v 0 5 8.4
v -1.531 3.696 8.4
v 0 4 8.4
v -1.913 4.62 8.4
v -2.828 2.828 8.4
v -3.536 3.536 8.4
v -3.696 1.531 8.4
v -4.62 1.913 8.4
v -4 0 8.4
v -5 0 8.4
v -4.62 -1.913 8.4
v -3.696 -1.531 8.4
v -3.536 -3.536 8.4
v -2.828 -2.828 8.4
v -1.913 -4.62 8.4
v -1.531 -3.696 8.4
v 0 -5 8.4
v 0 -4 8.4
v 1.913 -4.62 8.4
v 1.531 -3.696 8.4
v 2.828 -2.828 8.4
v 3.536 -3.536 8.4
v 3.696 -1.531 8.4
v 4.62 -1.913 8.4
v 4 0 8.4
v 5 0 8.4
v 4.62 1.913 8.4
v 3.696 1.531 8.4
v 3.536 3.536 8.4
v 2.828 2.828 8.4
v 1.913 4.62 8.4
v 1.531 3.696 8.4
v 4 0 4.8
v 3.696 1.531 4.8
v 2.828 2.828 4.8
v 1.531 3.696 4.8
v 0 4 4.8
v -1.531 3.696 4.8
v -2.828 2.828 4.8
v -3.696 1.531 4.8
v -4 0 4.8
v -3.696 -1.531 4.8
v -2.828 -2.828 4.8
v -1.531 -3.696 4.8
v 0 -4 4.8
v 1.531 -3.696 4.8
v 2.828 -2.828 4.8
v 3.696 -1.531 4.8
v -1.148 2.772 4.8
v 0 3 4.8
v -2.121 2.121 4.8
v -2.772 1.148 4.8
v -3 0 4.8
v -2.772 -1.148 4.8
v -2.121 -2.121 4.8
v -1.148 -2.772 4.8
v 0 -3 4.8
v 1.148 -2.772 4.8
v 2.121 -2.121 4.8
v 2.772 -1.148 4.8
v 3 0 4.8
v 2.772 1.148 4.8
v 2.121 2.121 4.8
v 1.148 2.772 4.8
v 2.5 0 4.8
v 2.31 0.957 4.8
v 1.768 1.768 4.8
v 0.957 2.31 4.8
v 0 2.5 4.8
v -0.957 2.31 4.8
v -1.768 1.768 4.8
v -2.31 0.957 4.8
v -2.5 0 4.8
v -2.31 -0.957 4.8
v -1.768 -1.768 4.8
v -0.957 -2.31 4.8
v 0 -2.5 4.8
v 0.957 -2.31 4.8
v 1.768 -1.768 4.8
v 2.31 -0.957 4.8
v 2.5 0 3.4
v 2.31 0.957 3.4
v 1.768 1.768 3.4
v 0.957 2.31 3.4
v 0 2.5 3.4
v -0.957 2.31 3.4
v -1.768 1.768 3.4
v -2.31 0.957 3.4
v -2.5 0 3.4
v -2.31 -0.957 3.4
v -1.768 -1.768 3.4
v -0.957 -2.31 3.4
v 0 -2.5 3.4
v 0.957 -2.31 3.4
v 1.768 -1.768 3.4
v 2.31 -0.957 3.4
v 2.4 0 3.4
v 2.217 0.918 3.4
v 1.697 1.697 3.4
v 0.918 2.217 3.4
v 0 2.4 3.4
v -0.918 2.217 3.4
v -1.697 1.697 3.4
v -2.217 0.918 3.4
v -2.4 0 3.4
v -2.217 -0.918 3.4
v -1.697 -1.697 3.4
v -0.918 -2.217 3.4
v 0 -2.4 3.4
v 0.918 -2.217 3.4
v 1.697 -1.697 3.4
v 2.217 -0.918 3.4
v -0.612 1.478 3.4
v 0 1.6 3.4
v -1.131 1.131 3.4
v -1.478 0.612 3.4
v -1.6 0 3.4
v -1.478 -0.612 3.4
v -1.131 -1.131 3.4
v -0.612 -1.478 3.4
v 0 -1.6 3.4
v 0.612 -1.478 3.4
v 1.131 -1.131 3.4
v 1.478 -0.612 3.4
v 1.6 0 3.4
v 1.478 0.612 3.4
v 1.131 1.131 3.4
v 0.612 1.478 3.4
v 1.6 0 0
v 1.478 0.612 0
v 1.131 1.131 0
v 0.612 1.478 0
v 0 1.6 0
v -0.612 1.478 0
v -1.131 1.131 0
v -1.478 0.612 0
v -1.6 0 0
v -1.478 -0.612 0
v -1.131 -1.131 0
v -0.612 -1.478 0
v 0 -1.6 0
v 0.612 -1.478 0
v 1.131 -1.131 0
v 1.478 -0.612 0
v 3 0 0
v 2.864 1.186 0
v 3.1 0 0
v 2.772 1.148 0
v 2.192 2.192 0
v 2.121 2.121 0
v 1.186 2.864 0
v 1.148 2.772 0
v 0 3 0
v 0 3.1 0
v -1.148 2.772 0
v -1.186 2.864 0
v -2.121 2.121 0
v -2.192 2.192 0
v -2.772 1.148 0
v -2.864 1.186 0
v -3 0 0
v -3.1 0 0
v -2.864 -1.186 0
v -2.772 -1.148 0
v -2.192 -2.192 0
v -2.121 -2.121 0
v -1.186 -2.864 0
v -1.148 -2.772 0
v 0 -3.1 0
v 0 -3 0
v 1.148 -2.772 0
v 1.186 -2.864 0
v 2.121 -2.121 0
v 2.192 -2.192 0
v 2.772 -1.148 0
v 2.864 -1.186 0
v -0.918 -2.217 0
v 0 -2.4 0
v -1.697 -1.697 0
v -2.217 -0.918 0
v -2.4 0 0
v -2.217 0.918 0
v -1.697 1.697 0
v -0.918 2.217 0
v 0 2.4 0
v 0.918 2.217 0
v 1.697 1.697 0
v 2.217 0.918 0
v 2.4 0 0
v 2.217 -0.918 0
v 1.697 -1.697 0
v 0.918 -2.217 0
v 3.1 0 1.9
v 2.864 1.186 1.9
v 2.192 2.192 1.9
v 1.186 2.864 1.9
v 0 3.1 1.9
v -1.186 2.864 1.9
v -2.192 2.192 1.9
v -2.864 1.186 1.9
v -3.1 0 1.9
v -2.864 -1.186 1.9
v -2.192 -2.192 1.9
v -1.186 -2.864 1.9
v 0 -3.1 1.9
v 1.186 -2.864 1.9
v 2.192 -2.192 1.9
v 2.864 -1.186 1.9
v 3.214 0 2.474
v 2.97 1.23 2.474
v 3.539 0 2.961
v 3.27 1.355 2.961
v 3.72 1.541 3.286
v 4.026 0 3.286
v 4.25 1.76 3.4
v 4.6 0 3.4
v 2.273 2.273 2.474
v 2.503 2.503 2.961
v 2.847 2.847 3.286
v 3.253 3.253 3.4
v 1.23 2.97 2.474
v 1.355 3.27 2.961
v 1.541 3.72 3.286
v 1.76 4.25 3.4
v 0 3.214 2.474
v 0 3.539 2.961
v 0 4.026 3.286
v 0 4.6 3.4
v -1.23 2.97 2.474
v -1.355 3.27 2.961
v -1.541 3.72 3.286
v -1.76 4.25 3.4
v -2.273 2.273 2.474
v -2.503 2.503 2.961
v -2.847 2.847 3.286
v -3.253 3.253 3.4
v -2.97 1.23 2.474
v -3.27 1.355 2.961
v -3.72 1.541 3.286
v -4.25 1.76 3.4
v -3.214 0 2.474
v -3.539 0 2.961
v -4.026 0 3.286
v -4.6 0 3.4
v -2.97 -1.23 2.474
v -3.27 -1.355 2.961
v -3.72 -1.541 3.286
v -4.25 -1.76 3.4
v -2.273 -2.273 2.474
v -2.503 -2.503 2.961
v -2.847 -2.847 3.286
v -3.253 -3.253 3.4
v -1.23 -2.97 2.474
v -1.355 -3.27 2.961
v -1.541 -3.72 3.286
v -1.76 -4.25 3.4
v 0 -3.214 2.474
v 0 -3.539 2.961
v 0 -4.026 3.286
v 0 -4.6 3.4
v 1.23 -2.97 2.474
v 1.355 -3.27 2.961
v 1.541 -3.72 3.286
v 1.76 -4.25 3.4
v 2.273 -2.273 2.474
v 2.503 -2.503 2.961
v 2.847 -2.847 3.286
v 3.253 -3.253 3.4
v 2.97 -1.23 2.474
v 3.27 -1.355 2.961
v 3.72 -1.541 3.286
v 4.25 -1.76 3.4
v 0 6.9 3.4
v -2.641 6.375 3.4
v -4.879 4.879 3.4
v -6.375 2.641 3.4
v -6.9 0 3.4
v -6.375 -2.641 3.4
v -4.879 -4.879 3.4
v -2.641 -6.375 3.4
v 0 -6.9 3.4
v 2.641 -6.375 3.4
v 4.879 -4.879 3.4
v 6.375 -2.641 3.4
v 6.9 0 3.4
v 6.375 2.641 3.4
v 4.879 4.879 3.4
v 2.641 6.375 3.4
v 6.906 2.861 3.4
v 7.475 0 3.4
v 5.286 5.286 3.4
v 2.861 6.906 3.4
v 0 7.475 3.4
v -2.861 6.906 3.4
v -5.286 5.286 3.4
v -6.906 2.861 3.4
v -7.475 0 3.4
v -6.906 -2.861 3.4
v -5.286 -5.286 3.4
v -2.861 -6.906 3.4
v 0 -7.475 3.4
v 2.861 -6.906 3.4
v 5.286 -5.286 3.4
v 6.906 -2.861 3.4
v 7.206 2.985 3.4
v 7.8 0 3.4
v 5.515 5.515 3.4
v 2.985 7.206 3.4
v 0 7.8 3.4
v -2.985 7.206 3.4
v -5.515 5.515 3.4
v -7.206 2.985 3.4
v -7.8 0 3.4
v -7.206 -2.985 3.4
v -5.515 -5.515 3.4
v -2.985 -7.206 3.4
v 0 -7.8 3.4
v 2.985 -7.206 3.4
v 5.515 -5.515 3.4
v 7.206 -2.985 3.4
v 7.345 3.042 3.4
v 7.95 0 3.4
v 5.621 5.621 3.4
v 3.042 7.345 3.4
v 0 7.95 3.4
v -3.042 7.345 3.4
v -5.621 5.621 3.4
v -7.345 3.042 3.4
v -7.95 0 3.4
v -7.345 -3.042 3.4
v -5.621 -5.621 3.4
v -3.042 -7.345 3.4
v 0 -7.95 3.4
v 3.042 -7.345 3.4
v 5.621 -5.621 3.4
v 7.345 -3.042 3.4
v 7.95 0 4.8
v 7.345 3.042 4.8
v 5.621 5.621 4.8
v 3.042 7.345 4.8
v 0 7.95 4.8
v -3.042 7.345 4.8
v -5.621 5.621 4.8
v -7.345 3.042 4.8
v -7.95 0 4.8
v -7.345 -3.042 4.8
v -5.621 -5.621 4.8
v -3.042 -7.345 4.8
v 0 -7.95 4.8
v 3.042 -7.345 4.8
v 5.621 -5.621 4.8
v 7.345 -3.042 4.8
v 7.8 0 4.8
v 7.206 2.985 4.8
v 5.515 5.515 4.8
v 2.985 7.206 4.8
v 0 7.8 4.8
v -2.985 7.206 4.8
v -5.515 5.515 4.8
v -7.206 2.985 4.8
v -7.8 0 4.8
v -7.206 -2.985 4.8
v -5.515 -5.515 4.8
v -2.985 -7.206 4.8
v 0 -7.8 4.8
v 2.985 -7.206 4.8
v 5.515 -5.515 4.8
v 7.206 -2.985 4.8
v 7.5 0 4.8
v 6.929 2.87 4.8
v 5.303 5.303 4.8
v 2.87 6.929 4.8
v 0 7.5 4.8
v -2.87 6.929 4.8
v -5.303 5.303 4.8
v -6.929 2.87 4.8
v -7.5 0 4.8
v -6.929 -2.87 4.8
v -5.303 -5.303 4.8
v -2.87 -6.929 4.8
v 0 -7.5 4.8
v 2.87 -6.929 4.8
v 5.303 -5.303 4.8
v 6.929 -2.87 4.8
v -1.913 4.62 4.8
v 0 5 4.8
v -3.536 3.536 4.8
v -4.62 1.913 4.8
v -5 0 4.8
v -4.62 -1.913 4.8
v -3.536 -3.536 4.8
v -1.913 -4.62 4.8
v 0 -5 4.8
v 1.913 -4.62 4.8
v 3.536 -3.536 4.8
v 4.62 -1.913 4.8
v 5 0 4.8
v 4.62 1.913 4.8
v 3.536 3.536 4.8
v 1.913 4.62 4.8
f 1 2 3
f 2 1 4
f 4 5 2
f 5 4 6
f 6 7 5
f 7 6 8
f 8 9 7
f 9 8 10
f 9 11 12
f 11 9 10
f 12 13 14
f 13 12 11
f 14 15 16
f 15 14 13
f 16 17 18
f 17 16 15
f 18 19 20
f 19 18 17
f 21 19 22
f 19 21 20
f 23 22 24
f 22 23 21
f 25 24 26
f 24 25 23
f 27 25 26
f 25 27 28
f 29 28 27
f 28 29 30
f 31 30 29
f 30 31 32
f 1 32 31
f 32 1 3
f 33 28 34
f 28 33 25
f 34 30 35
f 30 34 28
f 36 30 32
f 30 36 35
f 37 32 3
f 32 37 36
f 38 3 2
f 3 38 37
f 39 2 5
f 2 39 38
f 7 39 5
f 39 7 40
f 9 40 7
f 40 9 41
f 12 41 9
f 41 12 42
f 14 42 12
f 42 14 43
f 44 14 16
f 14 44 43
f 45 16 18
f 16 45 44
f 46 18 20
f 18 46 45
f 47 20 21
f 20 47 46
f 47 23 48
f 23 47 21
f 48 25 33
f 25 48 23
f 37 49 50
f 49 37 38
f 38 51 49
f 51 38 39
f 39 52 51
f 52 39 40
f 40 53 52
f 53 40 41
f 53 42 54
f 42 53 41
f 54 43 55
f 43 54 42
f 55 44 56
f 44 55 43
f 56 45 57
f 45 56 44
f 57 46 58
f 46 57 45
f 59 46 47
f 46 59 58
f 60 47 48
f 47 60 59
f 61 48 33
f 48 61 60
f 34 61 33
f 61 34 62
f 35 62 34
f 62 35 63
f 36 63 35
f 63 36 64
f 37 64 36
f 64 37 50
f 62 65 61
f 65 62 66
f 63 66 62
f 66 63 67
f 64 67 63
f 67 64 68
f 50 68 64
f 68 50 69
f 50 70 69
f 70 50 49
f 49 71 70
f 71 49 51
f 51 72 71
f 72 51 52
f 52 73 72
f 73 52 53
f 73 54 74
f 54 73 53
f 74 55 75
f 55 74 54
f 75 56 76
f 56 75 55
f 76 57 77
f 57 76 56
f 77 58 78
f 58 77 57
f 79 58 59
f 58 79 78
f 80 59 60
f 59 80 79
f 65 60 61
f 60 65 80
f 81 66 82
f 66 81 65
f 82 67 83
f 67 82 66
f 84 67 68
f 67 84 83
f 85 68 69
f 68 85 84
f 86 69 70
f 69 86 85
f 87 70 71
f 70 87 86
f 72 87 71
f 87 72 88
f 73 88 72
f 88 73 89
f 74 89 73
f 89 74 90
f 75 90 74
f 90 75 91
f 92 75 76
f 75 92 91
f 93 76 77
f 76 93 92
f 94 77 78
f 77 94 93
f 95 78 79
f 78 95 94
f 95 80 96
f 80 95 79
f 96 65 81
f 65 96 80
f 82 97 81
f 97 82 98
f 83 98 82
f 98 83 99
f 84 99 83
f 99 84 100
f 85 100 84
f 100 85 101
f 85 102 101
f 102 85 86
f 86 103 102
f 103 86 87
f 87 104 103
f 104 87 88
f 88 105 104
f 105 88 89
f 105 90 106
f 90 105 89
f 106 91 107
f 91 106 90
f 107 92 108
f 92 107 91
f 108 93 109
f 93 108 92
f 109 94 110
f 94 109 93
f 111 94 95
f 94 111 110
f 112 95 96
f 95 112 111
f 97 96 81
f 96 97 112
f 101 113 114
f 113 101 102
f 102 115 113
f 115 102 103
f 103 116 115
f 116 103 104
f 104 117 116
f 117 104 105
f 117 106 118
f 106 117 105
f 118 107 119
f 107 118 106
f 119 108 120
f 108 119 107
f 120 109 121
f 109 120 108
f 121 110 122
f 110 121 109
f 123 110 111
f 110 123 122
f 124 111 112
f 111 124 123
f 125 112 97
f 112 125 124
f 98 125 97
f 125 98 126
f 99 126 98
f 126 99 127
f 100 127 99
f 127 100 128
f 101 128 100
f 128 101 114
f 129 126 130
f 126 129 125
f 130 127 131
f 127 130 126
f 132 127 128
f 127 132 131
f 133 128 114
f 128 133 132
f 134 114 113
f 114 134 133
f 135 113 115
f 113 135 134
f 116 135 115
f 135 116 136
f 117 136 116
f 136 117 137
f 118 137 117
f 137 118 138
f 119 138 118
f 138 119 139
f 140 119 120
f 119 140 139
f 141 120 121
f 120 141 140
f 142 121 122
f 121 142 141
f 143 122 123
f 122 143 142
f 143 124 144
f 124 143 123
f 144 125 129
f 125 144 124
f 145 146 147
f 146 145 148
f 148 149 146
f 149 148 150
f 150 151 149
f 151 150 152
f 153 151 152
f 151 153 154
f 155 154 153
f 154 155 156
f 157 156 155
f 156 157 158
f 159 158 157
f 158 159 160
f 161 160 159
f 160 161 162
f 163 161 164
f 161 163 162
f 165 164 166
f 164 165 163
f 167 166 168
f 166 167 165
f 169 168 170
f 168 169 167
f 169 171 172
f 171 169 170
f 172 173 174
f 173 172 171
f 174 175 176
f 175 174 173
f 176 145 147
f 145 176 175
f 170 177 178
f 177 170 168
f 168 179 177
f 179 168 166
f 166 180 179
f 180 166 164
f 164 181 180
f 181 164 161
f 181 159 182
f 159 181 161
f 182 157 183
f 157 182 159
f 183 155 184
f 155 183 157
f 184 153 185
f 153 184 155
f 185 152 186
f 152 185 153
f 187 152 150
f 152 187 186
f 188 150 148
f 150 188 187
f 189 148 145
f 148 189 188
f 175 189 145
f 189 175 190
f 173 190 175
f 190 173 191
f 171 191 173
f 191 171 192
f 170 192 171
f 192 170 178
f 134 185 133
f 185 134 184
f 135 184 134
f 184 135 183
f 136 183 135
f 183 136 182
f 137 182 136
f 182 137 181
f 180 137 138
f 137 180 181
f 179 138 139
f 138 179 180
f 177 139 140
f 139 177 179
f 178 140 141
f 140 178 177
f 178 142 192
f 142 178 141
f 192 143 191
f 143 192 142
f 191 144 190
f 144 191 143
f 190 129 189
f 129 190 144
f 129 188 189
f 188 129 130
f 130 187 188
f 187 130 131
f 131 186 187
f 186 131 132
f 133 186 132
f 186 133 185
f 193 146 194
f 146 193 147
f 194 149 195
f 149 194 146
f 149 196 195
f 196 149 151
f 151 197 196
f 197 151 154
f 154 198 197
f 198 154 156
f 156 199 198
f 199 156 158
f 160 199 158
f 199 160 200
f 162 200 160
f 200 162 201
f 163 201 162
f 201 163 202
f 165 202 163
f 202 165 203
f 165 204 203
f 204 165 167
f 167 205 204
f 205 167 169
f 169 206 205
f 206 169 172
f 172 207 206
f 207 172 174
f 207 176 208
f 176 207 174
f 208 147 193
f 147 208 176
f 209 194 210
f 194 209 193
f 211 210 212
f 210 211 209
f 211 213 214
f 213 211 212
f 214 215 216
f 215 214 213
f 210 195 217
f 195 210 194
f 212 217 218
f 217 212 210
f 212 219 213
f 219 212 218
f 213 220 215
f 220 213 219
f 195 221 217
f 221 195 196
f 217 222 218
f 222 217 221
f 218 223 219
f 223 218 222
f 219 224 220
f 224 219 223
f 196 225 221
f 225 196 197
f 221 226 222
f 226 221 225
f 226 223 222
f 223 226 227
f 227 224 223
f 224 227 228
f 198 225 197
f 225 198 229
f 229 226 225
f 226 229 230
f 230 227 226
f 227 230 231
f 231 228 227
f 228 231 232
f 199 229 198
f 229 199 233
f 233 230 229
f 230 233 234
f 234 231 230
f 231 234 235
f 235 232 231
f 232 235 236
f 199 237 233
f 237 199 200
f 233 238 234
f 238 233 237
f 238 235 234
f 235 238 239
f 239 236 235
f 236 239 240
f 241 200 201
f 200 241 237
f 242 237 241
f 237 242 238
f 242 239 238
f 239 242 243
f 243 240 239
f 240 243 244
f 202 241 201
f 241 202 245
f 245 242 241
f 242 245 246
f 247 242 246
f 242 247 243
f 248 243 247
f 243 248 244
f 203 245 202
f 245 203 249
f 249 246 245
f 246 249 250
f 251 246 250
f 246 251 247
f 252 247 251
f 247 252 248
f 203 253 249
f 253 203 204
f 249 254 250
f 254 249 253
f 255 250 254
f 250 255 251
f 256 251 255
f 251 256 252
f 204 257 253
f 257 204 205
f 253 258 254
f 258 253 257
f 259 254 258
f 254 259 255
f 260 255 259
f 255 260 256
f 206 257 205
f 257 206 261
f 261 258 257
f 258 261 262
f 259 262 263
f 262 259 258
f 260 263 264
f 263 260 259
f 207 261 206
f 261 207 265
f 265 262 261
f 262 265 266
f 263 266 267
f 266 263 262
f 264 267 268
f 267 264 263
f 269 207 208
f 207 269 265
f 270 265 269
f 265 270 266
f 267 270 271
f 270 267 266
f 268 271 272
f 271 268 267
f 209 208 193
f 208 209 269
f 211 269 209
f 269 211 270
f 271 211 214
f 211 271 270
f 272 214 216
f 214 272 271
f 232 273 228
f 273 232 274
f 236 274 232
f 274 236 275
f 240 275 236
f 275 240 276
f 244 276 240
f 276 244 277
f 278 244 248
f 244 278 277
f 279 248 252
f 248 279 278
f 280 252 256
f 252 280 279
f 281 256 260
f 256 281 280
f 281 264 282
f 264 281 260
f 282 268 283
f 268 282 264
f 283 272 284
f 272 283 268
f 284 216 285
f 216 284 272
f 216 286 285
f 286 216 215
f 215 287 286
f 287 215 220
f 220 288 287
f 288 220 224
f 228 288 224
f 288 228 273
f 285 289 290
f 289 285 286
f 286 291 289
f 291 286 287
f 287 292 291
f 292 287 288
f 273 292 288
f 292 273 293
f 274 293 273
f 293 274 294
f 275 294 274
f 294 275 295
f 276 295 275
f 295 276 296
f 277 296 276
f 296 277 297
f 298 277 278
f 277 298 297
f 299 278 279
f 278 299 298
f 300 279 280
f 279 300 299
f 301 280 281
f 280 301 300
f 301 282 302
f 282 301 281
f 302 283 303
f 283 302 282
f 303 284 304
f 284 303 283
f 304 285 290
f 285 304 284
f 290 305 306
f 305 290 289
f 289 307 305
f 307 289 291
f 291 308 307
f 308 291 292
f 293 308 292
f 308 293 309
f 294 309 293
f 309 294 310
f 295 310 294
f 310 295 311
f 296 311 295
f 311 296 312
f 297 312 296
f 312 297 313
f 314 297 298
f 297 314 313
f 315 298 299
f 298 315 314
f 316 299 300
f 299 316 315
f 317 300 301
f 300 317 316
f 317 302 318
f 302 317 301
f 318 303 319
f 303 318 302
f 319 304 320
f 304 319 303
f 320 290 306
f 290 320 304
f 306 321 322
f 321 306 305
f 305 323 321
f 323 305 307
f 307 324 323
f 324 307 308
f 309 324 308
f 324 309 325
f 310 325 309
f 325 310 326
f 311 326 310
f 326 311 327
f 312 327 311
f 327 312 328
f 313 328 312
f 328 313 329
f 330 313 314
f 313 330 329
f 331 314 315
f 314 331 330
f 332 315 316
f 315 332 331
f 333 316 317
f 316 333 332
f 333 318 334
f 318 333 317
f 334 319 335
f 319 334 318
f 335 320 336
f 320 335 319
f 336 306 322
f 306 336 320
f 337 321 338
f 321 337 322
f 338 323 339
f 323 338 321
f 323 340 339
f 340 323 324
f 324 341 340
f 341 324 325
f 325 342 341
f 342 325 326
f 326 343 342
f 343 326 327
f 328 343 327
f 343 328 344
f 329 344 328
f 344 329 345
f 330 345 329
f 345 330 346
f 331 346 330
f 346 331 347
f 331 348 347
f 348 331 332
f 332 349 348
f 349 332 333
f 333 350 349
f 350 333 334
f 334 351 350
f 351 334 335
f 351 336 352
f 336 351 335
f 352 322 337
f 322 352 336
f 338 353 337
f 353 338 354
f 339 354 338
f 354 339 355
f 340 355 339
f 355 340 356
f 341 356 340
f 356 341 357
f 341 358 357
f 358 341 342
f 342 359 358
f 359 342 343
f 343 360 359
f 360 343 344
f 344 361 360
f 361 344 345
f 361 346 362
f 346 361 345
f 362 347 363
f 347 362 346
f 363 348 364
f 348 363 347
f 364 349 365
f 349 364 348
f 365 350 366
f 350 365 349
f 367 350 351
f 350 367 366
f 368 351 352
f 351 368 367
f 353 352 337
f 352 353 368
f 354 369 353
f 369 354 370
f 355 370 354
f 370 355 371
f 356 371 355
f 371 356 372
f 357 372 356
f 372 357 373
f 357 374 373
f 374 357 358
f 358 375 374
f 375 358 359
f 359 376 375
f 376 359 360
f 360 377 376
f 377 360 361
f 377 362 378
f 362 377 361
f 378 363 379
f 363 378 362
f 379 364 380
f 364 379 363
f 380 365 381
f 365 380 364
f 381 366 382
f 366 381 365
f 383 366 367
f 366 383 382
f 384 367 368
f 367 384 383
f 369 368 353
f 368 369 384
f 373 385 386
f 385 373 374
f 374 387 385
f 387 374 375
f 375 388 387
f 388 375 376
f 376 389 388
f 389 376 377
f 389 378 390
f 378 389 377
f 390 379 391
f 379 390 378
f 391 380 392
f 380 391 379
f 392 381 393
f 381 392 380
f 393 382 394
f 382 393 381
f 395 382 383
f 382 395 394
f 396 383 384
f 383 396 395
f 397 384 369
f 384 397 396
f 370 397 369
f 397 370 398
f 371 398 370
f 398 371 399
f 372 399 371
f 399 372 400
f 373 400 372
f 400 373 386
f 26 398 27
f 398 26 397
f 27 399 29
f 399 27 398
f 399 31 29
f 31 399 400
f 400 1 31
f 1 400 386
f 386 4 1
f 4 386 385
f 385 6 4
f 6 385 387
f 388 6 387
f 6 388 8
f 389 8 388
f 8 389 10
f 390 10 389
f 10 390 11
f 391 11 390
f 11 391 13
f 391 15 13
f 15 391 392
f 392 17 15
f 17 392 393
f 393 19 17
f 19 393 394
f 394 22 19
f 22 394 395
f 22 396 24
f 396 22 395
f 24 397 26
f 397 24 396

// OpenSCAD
use <../lib.scad>
use <../p/4-4cyli.scad>
use <../p/4-4cylo.scad>
use <../p/4-4edge.scad>
use <../p/4-4rin12.scad>
use <../p/4-4rin23.scad>
use <../p/4-4rin24.scad>
use <../p/4-4rin25.scad>
use <../p/4-4rin30.scad>
use <../p/4-4rin52.scad>
use <../p/4-4ring2.scad>
use <../p/4-4ring3.scad>
use <../p/4-4ring4.scad>
use <../p/4-4ring5.scad>
use <../p/t01i3261.scad>
$fa=1; $fs=0.2;
function ldraw_lib__u9261(realsolid=false) = [
// 0 ~Turntable  4 x  4 Centre Connector Underside
// 0 Name: u9261.dat
// 0 Author: Max Martin Richter [MMR1988]
// 0 !LDRAW_ORG Part UPDATE 2013-01
// 0 !LICENSE Licensed under CC BY 2.0 and CC BY 4.0 : see CAreadme.txt
// 
// 0 BFC CERTIFY CCW
  [0,"BFC","CERTIFY"],
  [0,"BFC","CCW"],
// 
// 0 !CMDLINE -c15
// 
// 0 !HISTORY 2013-07-21 [PTadmin] Official Update 2013-01
// 
// 
// 1 16 0 -21 0 2.5 0 0 0 1 0 0 0 2.5 4-4ring4.dat
  [1,16,0,-21,0,2.5,0,0,0,1,0,0,0,2.5, ldraw_lib__4_4ring4(realsolid)],
// 
// 0 BFC INVERTNEXT
  [0,"BFC","INVERTNEXT"],
// 1 16 0 -21 0 10 0 0 0 9 0 0 0 10 4-4cylo.dat
  [1,16,0,-21,0,10,0,0,0,9,0,0,0,10, ldraw_lib__4_4cylo(realsolid)],
// 
// 1 16 0 -12 0 2.5 0 0 0 1 0 0 0 2.5 4-4ring3.dat
  [1,16,0,-12,0,2.5,0,0,0,1,0,0,0,2.5, ldraw_lib__4_4ring3(realsolid)],
// 1 16 0 -12 0 1.25 0 0 0 1 0 0 0 1.25 4-4ring5.dat
  [1,16,0,-12,0,1.25,0,0,0,1,0,0,0,1.25, ldraw_lib__4_4ring5(realsolid)],
// 
// 0 BFC INVERTNEXT
  [0,"BFC","INVERTNEXT"],
// 1 16 0 -12 0 6.25 0 0 0 3.5 0 0 0 6.25 4-4cylo.dat
  [1,16,0,-12,0,6.25,0,0,0,3.5,0,0,0,6.25, ldraw_lib__4_4cylo(realsolid)],
// 
// 1 16 0 -8.5 0 0.25 0 0 0 1 0 0 0 0.25 4-4rin24.dat
  [1,16,0,-8.5,0,0.25,0,0,0,1,0,0,0,0.25, ldraw_lib__4_4rin24(realsolid)],
// 1 16 0 -8.5 0 2 0 0 0 1 0 0 0 2 4-4ring2.dat
  [1,16,0,-8.5,0,2,0,0,0,1,0,0,0,2, ldraw_lib__4_4ring2(realsolid)],
// 
// 0 BFC INVERTNEXT
  [0,"BFC","INVERTNEXT"],
// 1 16 0 -8.5 0 4 0 0 0 8.5 0 0 0 4 4-4cylo.dat
  [1,16,0,-8.5,0,4,0,0,0,8.5,0,0,0,4, ldraw_lib__4_4cylo(realsolid)],
// 
// 1 16 0 0 0 0.25 0 0 0 -1 0 0 0 0.25 4-4rin30.dat
  [1,16,0,0,0,0.25,0,0,0,-1,0,0,0,0.25, ldraw_lib__4_4rin30(realsolid)],
// 1 16 0 0 0 1.5 0 0 0 -1 0 0 0 -1.5 4-4ring4.dat
  [1,16,0,0,0,1.5,0,0,0,-1,0,0,0,-1.5, ldraw_lib__4_4ring4(realsolid)],
// 1 16 0 0 0 2 0 0 0 -1 0 0 0 2 4-4ring2.dat
  [1,16,0,0,0,2,0,0,0,-1,0,0,0,2, ldraw_lib__4_4ring2(realsolid)],
// 1 16 0 0 0 7.75 0 0 0 1 0 0 0 7.75 4-4edge.dat
  [1,16,0,0,0,7.75,0,0,0,1,0,0,0,7.75, ldraw_lib__4_4edge(realsolid)],
// 
// 1 16 0 -4.75 0 7.75 0 0 0 4.75 0 0 0 7.75 4-4cyli.dat
  [1,16,0,-4.75,0,7.75,0,0,0,4.75,0,0,0,7.75, ldraw_lib__4_4cyli(realsolid)],
// 0 BFC INVERTNEXT
  [0,"BFC","INVERTNEXT"],
// 1 16 0 -4.75 0 11.5 0 0 0 -11.5 0 0 0 11.5 t01i3261.dat
  [1,16,0,-4.75,0,11.5,0,0,0,-11.5,0,0,0,11.5, ldraw_lib__t01i3261(realsolid)],
// 
// 1 16 0 -8.5 0 5.75 0 0 0 -1 0 0 0 5.75 4-4ring2.dat
  [1,16,0,-8.5,0,5.75,0,0,0,-1,0,0,0,5.75, ldraw_lib__4_4ring2(realsolid)],
// 1 16 0 -8.5 0 1.4375 0 0 0 -1 0 0 0 1.4375 4-4rin12.dat
  [1,16,0,-8.5,0,1.4375,0,0,0,-1,0,0,0,1.4375, ldraw_lib__4_4rin12(realsolid)],
// 1 16 0 -8.5 0 0.8125 0 0 0 -1 0 0 0 0.8125 4-4rin23.dat
  [1,16,0,-8.5,0,0.8125,0,0,0,-1,0,0,0,0.8125, ldraw_lib__4_4rin23(realsolid)],
// 1 16 0 -8.5 0 0.375 0 0 0 -1 0 0 0 0.375 4-4rin52.dat
  [1,16,0,-8.5,0,0.375,0,0,0,-1,0,0,0,0.375, ldraw_lib__4_4rin52(realsolid)],
// 
// 1 16 0 -12 0 19.875 0 0 0 3.5 0 0 0 19.875 4-4cylo.dat
  [1,16,0,-12,0,19.875,0,0,0,3.5,0,0,0,19.875, ldraw_lib__4_4cylo(realsolid)],
// 
// 1 16 0 -12 0 0.375 0 0 0 1 0 0 0 0.375 4-4rin52.dat
  [1,16,0,-12,0,0.375,0,0,0,1,0,0,0,0.375, ldraw_lib__4_4rin52(realsolid)],
// 1 16 0 -12 0 0.75 0 0 0 1 0 0 0 0.75 4-4rin25.dat
  [1,16,0,-12,0,0.75,0,0,0,1,0,0,0,0.75, ldraw_lib__4_4rin25(realsolid)],
// 1 16 0 -12 0 6.25 0 0 0 1 0 0 0 6.25 4-4ring2.dat
  [1,16,0,-12,0,6.25,0,0,0,1,0,0,0,6.25, ldraw_lib__4_4ring2(realsolid)],
// 
// 1 16 0 -21 0 12.5 0 0 0 9 0 0 0 12.5 4-4cylo.dat
  [1,16,0,-21,0,12.5,0,0,0,9,0,0,0,12.5, ldraw_lib__4_4cylo(realsolid)],
];
module ldraw_lib__u9261(step=0, col=false, unit=2/5, alt=false, line=0.2, solid=!$preview)
    makepoly(ldraw_lib__u9261(solid), step=step, col=col, unit=unit, alt=alt, line=line, solid=solid);
ldraw_lib__u9261(line=0.2);
